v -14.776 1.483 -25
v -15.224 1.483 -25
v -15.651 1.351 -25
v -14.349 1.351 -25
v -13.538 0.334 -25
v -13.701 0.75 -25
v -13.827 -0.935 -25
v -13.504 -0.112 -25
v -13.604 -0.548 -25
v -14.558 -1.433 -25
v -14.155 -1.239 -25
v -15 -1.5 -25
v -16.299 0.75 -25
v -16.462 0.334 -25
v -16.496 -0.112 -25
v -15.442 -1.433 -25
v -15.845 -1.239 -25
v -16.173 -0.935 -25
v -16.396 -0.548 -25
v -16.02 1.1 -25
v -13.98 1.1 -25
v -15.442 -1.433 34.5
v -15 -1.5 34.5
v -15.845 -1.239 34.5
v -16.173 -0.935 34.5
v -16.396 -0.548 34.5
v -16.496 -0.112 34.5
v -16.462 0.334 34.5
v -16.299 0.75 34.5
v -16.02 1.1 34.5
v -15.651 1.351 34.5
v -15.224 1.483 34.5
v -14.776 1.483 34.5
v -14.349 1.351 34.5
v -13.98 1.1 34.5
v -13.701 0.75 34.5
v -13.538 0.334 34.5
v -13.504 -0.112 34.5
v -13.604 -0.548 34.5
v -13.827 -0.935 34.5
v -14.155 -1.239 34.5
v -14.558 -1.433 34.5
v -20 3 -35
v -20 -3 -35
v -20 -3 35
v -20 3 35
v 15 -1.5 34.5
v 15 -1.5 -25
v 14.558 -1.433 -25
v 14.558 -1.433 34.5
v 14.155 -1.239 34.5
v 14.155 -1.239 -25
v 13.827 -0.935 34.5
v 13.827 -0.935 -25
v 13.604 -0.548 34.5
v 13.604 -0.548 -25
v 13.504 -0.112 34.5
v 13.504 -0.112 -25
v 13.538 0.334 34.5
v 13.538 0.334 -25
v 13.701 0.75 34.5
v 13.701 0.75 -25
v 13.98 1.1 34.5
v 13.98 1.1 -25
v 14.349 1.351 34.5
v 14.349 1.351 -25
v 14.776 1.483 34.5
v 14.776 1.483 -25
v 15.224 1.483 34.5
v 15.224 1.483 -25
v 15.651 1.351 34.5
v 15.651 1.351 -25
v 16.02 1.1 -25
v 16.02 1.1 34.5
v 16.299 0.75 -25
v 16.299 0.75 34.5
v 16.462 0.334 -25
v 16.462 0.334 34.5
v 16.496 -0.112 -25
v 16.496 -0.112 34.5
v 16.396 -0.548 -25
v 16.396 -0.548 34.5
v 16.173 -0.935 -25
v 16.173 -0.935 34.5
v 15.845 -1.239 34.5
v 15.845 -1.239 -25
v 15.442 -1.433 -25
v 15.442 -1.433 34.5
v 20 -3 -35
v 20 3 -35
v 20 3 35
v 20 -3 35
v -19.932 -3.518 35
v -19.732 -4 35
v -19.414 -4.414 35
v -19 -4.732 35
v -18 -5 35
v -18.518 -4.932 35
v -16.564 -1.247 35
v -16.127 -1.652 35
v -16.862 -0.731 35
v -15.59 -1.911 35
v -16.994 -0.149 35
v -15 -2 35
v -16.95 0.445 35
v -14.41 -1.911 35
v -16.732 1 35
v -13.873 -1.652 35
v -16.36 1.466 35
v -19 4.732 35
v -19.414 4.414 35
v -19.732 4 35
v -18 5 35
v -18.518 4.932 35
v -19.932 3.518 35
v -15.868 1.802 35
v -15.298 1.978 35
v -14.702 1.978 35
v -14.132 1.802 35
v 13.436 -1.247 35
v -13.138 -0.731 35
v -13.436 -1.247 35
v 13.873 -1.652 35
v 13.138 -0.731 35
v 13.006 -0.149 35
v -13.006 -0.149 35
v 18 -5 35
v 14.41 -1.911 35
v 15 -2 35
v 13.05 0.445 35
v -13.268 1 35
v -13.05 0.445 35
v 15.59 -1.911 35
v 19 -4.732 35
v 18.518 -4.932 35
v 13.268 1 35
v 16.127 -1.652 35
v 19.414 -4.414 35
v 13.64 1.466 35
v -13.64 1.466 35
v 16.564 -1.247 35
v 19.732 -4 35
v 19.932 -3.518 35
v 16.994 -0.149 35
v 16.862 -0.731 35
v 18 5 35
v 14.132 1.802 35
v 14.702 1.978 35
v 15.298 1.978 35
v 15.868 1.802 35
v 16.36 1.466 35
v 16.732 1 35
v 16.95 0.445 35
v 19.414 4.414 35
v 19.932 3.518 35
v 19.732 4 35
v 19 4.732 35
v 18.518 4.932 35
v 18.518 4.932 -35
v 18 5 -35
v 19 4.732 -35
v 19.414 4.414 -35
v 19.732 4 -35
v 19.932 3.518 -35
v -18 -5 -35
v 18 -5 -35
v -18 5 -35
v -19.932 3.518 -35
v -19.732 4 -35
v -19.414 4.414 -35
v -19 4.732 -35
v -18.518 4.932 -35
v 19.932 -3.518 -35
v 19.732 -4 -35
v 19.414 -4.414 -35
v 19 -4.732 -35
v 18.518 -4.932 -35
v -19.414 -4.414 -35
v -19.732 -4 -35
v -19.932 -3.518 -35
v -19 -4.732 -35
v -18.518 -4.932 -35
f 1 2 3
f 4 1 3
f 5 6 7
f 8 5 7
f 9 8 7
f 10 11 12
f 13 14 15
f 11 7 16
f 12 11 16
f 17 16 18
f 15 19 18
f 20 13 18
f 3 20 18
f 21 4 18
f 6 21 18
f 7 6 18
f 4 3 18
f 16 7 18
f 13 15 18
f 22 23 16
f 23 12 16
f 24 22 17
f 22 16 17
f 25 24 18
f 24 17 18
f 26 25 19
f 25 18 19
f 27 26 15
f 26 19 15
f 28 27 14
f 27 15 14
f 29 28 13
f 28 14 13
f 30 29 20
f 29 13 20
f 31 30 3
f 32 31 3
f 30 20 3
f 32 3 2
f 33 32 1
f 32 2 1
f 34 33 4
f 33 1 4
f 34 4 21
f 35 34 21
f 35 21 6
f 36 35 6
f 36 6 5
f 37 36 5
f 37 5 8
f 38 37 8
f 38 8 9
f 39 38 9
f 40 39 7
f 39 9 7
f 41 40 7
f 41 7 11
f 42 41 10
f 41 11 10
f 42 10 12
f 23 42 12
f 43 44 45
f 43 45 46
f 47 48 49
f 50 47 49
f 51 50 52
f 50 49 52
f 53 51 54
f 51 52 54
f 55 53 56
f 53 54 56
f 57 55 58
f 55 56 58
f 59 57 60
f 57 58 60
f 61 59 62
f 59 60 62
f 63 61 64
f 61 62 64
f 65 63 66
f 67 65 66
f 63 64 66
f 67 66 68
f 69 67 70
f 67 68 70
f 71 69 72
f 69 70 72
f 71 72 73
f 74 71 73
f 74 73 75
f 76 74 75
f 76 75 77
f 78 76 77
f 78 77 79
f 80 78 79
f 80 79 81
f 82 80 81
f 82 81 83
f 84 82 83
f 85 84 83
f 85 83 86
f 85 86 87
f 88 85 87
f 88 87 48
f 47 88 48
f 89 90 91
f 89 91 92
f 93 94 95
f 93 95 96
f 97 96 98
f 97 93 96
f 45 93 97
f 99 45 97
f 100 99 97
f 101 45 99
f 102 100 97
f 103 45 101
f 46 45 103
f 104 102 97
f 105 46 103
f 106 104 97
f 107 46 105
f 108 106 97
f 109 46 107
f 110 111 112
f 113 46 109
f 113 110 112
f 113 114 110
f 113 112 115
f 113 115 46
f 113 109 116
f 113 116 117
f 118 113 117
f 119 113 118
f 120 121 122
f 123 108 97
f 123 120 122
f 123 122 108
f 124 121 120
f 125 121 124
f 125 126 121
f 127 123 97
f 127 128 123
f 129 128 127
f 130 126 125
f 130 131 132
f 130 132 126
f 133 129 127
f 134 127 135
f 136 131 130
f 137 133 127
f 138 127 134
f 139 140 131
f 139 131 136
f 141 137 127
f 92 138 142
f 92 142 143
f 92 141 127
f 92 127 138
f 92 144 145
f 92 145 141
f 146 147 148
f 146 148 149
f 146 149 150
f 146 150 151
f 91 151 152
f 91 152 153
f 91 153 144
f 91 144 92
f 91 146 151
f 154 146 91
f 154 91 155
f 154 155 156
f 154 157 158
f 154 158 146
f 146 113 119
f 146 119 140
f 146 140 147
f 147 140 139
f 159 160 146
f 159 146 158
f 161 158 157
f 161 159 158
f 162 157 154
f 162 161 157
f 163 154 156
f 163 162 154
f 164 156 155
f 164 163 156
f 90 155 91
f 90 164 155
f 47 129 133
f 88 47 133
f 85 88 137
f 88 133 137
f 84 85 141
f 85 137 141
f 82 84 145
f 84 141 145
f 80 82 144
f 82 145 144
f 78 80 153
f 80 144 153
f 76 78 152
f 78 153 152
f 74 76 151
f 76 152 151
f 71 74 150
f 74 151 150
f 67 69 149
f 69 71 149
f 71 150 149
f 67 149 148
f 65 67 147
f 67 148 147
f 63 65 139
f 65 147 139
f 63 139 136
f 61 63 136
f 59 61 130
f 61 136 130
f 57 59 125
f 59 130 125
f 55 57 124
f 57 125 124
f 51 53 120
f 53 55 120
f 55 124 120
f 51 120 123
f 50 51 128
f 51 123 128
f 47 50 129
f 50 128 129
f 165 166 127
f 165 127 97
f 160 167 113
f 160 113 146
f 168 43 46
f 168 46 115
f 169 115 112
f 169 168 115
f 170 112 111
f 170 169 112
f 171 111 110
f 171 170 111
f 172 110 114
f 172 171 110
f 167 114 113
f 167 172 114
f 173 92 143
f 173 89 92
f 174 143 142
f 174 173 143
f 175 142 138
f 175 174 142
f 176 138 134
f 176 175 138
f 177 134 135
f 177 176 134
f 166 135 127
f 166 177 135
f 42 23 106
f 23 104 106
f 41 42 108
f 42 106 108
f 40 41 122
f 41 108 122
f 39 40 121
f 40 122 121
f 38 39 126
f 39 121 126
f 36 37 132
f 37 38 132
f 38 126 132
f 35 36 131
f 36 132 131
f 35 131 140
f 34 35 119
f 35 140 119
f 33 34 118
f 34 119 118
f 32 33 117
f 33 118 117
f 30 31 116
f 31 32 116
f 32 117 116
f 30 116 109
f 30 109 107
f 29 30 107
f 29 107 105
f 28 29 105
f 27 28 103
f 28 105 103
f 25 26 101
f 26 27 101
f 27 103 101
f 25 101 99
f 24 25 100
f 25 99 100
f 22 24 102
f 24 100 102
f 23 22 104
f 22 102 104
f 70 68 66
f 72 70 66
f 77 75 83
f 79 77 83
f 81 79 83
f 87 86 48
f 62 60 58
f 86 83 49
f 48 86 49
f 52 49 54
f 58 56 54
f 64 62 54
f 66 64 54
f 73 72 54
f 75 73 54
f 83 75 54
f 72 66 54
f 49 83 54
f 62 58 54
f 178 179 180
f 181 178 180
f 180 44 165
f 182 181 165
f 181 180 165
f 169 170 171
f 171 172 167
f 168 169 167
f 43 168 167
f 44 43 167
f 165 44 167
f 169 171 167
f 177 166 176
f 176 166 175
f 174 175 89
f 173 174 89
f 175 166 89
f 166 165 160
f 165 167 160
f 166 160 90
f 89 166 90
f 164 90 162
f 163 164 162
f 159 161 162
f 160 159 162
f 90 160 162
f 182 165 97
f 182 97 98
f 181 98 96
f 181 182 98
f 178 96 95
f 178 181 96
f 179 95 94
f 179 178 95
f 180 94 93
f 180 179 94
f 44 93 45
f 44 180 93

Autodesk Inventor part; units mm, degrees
ref_plane "YZ Plane" through (0, 0, 0) normal (1, 0, 0) x (0, 1, 0)
ref_plane "XZ Plane" through (0, 0, 0) normal (0, 1, 0) x (-1, 0, 0)
ref_plane "XY Plane" through (0, 0, 0) normal (0, 0, 1) x (1, 0, 0)
sketch "Эскиз1" plane through (0, 0, 0) normal (0, 0, 1) x (1, 0, 0)
  line L0 (18, -5) -> (-18, -5)
  line L1 (-20, -3) -> (-20, 3)
  line L2 (-18, 5) -> (18, 5)
  line L3 (20, 3) -> (20, -3)
  line L4 (20, -5) -> (-20, 5) construction
  line L5 (-20, -5) -> (20, 5) construction
  arc A0 (-18, 5) -> (-20, 3) centre (-18, 3) ccw
  arc A1 (-20, -3) -> (-18, -5) centre (-18, -3) ccw
  arc A2 (20, 3) -> (18, 5) centre (18, 3) ccw
  arc A3 (18, -5) -> (20, -3) centre (18, -3) ccw
  point P0 (0, 0)
  dimension "d0" = 40
  dimension "d1" = 10
  dimension "d2" = 2
extrude "Выдавливание1" add sketch "Эскиз1" along normal mid plane 70
sketch "Эскиз2" plane through (0, 0, 35) normal (0, 0, 1) x (1, 0, 0)
  line L0 (0, 0) -> (0, 11.0353) construction
  point P0 (-15, 0)
  point P1 (15, 0)
  dimension "d5" = 30
hole "Отверстие1" at (-15, 0, 35) at (15, 0, 35) direction (0, 0, -1) diameter 3 depth 60
chamfer "Фаска1" distance 0.5 angle 45 2 edges at (-15, 1.5, 35) (15, 1.5, 35)
properties part number "Стенка БСП"
